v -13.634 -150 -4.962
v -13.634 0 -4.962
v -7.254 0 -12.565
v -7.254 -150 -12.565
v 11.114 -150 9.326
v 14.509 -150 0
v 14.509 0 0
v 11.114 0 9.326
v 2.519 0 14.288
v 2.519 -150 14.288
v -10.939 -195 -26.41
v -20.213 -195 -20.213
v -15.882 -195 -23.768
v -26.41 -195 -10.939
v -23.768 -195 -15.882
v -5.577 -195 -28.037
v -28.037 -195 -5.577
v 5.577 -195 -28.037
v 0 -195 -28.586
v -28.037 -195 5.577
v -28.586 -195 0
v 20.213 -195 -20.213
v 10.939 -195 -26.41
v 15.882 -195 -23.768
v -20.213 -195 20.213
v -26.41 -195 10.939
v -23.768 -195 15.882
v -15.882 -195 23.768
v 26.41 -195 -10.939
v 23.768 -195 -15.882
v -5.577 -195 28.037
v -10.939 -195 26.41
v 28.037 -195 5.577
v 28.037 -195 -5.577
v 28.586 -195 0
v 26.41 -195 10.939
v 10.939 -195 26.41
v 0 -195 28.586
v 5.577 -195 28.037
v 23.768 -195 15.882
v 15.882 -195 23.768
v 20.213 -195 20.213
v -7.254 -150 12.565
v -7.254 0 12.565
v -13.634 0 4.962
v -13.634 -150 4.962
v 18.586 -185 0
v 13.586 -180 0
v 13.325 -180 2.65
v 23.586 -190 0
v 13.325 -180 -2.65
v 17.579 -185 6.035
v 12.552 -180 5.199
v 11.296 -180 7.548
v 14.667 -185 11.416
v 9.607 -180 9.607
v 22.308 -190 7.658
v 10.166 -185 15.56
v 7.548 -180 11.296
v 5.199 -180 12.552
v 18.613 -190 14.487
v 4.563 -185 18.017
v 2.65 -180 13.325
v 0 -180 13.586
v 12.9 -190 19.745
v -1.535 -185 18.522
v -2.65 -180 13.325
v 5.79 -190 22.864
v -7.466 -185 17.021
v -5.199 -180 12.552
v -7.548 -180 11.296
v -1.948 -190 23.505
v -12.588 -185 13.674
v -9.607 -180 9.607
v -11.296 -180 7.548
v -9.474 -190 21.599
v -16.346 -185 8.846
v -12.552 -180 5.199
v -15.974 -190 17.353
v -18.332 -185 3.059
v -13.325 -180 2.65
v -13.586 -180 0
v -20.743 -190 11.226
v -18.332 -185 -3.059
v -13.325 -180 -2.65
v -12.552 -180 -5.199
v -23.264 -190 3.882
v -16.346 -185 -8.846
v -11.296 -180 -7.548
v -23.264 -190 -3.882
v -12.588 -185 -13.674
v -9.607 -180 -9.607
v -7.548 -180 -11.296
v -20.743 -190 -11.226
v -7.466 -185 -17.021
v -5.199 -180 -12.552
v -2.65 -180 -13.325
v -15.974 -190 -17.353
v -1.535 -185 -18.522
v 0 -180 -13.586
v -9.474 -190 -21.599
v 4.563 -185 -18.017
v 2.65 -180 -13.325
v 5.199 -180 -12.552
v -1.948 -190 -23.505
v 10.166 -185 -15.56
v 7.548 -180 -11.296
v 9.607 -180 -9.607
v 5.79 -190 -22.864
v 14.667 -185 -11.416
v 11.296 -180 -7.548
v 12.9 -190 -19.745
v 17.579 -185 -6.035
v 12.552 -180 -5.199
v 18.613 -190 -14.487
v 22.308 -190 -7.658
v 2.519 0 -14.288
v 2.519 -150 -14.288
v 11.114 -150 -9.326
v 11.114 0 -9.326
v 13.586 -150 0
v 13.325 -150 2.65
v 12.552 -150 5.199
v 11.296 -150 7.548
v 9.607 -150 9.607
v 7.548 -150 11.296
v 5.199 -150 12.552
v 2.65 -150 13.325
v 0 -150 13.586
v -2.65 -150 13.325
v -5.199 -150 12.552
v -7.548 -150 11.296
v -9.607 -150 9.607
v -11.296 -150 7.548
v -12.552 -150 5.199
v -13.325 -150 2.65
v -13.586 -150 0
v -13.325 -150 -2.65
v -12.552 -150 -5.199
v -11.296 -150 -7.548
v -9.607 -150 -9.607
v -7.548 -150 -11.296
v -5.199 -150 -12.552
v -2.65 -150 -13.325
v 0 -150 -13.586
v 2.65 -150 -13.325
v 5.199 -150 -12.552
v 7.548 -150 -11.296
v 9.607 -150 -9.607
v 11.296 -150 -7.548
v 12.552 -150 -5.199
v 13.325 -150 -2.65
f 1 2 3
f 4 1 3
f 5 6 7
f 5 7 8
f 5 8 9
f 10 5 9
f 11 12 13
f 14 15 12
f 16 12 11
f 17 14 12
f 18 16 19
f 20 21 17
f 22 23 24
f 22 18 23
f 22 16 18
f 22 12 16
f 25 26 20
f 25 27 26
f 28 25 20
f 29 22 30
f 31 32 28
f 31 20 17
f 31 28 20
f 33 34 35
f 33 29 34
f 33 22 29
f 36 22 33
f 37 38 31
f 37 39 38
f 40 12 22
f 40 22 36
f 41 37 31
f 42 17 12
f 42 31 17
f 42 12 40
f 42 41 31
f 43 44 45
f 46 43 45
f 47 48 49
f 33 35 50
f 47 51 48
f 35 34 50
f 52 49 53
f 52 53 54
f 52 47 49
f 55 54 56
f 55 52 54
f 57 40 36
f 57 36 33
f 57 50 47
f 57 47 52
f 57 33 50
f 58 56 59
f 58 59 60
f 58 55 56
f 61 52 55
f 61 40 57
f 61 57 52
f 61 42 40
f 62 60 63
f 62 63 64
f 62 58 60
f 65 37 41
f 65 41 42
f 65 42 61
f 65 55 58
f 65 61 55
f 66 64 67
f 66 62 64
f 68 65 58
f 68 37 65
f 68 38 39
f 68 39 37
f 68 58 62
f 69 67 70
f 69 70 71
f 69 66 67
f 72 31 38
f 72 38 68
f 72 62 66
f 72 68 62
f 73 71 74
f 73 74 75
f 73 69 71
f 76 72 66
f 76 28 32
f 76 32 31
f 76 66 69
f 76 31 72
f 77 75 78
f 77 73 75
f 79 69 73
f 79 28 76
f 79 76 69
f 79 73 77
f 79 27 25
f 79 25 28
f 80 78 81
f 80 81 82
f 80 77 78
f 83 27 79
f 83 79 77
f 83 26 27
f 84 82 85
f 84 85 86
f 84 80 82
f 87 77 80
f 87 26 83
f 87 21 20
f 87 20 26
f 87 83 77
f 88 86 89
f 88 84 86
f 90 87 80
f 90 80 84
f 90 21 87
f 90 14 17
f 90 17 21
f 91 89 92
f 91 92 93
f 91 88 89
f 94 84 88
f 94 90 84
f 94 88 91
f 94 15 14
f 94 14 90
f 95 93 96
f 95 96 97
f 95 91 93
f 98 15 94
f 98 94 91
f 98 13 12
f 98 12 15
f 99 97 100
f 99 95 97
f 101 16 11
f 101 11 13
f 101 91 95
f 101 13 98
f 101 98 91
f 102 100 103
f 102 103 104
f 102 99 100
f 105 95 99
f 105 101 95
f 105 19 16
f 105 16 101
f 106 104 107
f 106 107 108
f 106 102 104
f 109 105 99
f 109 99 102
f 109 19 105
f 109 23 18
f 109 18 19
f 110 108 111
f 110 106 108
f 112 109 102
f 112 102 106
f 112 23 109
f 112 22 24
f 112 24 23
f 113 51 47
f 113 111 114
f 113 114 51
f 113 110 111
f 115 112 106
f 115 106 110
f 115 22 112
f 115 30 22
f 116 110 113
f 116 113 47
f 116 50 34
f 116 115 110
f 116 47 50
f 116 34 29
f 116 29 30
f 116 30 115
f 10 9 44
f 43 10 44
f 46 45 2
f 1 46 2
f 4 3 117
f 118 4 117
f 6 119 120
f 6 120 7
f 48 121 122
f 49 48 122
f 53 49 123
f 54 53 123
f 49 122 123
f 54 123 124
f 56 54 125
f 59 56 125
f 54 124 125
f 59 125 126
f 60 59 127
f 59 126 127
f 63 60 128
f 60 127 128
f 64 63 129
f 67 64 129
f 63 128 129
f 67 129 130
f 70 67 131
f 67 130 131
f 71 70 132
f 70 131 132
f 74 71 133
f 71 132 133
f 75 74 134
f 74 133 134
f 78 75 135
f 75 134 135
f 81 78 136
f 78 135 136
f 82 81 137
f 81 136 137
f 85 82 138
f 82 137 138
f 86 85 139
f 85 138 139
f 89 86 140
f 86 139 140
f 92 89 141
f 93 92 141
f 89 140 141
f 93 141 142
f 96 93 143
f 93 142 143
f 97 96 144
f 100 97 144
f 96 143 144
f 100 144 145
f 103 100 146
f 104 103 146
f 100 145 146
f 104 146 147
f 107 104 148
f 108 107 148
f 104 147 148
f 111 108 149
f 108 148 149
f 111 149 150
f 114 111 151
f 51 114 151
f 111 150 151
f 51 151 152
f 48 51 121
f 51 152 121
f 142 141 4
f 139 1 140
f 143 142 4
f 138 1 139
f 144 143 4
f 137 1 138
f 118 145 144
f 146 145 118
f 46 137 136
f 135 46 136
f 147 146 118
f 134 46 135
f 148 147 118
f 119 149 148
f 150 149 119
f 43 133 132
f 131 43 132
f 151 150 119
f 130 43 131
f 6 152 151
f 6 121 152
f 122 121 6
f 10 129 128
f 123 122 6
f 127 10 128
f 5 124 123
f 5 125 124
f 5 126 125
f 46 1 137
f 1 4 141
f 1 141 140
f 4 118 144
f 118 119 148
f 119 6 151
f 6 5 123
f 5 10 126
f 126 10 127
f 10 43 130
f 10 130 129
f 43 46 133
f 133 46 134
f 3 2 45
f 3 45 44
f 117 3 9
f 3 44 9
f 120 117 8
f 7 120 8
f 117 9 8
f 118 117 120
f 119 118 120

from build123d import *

# Parameters (mm, degrees)
F1_DEPTH  = 150
F2_R      = 13.5859557656
F3_DEPTH  = 30
F3_FACE_R = 13.5859557656
F4_DEPTH  = 15
F4_TAPER  = -45


with BuildPart() as f1:
    # F0 (on Front) → F1 (new body)
    with BuildSketch(Plane.XZ):
        Polygon((-13.63390591, 4.962335928), (-13.63390591, -4.962335928), (-7.2544498107, -12.5650756531), (2.5194439792, -14.2884768348), (11.1144619307, -9.3261409068), (14.5088996214, 0), (11.1144619307, 9.3261409068), (2.5194439792, 14.2884768348), (-7.2544498107, 12.5650756531), align=None)
    extrude(amount=F1_DEPTH)

    # F2 (on face) → F3 (join)
    with BuildSketch(Plane.XZ.offset(150)):
        Circle(F2_R)
    extrude(amount=F3_DEPTH)

    # F3_face (on face) → F4 (join)
    with BuildSketch(Plane.XZ.offset(180)):
        Circle(F3_FACE_R)
    extrude(amount=F4_DEPTH, taper=F4_TAPER)


solid = f1.part
